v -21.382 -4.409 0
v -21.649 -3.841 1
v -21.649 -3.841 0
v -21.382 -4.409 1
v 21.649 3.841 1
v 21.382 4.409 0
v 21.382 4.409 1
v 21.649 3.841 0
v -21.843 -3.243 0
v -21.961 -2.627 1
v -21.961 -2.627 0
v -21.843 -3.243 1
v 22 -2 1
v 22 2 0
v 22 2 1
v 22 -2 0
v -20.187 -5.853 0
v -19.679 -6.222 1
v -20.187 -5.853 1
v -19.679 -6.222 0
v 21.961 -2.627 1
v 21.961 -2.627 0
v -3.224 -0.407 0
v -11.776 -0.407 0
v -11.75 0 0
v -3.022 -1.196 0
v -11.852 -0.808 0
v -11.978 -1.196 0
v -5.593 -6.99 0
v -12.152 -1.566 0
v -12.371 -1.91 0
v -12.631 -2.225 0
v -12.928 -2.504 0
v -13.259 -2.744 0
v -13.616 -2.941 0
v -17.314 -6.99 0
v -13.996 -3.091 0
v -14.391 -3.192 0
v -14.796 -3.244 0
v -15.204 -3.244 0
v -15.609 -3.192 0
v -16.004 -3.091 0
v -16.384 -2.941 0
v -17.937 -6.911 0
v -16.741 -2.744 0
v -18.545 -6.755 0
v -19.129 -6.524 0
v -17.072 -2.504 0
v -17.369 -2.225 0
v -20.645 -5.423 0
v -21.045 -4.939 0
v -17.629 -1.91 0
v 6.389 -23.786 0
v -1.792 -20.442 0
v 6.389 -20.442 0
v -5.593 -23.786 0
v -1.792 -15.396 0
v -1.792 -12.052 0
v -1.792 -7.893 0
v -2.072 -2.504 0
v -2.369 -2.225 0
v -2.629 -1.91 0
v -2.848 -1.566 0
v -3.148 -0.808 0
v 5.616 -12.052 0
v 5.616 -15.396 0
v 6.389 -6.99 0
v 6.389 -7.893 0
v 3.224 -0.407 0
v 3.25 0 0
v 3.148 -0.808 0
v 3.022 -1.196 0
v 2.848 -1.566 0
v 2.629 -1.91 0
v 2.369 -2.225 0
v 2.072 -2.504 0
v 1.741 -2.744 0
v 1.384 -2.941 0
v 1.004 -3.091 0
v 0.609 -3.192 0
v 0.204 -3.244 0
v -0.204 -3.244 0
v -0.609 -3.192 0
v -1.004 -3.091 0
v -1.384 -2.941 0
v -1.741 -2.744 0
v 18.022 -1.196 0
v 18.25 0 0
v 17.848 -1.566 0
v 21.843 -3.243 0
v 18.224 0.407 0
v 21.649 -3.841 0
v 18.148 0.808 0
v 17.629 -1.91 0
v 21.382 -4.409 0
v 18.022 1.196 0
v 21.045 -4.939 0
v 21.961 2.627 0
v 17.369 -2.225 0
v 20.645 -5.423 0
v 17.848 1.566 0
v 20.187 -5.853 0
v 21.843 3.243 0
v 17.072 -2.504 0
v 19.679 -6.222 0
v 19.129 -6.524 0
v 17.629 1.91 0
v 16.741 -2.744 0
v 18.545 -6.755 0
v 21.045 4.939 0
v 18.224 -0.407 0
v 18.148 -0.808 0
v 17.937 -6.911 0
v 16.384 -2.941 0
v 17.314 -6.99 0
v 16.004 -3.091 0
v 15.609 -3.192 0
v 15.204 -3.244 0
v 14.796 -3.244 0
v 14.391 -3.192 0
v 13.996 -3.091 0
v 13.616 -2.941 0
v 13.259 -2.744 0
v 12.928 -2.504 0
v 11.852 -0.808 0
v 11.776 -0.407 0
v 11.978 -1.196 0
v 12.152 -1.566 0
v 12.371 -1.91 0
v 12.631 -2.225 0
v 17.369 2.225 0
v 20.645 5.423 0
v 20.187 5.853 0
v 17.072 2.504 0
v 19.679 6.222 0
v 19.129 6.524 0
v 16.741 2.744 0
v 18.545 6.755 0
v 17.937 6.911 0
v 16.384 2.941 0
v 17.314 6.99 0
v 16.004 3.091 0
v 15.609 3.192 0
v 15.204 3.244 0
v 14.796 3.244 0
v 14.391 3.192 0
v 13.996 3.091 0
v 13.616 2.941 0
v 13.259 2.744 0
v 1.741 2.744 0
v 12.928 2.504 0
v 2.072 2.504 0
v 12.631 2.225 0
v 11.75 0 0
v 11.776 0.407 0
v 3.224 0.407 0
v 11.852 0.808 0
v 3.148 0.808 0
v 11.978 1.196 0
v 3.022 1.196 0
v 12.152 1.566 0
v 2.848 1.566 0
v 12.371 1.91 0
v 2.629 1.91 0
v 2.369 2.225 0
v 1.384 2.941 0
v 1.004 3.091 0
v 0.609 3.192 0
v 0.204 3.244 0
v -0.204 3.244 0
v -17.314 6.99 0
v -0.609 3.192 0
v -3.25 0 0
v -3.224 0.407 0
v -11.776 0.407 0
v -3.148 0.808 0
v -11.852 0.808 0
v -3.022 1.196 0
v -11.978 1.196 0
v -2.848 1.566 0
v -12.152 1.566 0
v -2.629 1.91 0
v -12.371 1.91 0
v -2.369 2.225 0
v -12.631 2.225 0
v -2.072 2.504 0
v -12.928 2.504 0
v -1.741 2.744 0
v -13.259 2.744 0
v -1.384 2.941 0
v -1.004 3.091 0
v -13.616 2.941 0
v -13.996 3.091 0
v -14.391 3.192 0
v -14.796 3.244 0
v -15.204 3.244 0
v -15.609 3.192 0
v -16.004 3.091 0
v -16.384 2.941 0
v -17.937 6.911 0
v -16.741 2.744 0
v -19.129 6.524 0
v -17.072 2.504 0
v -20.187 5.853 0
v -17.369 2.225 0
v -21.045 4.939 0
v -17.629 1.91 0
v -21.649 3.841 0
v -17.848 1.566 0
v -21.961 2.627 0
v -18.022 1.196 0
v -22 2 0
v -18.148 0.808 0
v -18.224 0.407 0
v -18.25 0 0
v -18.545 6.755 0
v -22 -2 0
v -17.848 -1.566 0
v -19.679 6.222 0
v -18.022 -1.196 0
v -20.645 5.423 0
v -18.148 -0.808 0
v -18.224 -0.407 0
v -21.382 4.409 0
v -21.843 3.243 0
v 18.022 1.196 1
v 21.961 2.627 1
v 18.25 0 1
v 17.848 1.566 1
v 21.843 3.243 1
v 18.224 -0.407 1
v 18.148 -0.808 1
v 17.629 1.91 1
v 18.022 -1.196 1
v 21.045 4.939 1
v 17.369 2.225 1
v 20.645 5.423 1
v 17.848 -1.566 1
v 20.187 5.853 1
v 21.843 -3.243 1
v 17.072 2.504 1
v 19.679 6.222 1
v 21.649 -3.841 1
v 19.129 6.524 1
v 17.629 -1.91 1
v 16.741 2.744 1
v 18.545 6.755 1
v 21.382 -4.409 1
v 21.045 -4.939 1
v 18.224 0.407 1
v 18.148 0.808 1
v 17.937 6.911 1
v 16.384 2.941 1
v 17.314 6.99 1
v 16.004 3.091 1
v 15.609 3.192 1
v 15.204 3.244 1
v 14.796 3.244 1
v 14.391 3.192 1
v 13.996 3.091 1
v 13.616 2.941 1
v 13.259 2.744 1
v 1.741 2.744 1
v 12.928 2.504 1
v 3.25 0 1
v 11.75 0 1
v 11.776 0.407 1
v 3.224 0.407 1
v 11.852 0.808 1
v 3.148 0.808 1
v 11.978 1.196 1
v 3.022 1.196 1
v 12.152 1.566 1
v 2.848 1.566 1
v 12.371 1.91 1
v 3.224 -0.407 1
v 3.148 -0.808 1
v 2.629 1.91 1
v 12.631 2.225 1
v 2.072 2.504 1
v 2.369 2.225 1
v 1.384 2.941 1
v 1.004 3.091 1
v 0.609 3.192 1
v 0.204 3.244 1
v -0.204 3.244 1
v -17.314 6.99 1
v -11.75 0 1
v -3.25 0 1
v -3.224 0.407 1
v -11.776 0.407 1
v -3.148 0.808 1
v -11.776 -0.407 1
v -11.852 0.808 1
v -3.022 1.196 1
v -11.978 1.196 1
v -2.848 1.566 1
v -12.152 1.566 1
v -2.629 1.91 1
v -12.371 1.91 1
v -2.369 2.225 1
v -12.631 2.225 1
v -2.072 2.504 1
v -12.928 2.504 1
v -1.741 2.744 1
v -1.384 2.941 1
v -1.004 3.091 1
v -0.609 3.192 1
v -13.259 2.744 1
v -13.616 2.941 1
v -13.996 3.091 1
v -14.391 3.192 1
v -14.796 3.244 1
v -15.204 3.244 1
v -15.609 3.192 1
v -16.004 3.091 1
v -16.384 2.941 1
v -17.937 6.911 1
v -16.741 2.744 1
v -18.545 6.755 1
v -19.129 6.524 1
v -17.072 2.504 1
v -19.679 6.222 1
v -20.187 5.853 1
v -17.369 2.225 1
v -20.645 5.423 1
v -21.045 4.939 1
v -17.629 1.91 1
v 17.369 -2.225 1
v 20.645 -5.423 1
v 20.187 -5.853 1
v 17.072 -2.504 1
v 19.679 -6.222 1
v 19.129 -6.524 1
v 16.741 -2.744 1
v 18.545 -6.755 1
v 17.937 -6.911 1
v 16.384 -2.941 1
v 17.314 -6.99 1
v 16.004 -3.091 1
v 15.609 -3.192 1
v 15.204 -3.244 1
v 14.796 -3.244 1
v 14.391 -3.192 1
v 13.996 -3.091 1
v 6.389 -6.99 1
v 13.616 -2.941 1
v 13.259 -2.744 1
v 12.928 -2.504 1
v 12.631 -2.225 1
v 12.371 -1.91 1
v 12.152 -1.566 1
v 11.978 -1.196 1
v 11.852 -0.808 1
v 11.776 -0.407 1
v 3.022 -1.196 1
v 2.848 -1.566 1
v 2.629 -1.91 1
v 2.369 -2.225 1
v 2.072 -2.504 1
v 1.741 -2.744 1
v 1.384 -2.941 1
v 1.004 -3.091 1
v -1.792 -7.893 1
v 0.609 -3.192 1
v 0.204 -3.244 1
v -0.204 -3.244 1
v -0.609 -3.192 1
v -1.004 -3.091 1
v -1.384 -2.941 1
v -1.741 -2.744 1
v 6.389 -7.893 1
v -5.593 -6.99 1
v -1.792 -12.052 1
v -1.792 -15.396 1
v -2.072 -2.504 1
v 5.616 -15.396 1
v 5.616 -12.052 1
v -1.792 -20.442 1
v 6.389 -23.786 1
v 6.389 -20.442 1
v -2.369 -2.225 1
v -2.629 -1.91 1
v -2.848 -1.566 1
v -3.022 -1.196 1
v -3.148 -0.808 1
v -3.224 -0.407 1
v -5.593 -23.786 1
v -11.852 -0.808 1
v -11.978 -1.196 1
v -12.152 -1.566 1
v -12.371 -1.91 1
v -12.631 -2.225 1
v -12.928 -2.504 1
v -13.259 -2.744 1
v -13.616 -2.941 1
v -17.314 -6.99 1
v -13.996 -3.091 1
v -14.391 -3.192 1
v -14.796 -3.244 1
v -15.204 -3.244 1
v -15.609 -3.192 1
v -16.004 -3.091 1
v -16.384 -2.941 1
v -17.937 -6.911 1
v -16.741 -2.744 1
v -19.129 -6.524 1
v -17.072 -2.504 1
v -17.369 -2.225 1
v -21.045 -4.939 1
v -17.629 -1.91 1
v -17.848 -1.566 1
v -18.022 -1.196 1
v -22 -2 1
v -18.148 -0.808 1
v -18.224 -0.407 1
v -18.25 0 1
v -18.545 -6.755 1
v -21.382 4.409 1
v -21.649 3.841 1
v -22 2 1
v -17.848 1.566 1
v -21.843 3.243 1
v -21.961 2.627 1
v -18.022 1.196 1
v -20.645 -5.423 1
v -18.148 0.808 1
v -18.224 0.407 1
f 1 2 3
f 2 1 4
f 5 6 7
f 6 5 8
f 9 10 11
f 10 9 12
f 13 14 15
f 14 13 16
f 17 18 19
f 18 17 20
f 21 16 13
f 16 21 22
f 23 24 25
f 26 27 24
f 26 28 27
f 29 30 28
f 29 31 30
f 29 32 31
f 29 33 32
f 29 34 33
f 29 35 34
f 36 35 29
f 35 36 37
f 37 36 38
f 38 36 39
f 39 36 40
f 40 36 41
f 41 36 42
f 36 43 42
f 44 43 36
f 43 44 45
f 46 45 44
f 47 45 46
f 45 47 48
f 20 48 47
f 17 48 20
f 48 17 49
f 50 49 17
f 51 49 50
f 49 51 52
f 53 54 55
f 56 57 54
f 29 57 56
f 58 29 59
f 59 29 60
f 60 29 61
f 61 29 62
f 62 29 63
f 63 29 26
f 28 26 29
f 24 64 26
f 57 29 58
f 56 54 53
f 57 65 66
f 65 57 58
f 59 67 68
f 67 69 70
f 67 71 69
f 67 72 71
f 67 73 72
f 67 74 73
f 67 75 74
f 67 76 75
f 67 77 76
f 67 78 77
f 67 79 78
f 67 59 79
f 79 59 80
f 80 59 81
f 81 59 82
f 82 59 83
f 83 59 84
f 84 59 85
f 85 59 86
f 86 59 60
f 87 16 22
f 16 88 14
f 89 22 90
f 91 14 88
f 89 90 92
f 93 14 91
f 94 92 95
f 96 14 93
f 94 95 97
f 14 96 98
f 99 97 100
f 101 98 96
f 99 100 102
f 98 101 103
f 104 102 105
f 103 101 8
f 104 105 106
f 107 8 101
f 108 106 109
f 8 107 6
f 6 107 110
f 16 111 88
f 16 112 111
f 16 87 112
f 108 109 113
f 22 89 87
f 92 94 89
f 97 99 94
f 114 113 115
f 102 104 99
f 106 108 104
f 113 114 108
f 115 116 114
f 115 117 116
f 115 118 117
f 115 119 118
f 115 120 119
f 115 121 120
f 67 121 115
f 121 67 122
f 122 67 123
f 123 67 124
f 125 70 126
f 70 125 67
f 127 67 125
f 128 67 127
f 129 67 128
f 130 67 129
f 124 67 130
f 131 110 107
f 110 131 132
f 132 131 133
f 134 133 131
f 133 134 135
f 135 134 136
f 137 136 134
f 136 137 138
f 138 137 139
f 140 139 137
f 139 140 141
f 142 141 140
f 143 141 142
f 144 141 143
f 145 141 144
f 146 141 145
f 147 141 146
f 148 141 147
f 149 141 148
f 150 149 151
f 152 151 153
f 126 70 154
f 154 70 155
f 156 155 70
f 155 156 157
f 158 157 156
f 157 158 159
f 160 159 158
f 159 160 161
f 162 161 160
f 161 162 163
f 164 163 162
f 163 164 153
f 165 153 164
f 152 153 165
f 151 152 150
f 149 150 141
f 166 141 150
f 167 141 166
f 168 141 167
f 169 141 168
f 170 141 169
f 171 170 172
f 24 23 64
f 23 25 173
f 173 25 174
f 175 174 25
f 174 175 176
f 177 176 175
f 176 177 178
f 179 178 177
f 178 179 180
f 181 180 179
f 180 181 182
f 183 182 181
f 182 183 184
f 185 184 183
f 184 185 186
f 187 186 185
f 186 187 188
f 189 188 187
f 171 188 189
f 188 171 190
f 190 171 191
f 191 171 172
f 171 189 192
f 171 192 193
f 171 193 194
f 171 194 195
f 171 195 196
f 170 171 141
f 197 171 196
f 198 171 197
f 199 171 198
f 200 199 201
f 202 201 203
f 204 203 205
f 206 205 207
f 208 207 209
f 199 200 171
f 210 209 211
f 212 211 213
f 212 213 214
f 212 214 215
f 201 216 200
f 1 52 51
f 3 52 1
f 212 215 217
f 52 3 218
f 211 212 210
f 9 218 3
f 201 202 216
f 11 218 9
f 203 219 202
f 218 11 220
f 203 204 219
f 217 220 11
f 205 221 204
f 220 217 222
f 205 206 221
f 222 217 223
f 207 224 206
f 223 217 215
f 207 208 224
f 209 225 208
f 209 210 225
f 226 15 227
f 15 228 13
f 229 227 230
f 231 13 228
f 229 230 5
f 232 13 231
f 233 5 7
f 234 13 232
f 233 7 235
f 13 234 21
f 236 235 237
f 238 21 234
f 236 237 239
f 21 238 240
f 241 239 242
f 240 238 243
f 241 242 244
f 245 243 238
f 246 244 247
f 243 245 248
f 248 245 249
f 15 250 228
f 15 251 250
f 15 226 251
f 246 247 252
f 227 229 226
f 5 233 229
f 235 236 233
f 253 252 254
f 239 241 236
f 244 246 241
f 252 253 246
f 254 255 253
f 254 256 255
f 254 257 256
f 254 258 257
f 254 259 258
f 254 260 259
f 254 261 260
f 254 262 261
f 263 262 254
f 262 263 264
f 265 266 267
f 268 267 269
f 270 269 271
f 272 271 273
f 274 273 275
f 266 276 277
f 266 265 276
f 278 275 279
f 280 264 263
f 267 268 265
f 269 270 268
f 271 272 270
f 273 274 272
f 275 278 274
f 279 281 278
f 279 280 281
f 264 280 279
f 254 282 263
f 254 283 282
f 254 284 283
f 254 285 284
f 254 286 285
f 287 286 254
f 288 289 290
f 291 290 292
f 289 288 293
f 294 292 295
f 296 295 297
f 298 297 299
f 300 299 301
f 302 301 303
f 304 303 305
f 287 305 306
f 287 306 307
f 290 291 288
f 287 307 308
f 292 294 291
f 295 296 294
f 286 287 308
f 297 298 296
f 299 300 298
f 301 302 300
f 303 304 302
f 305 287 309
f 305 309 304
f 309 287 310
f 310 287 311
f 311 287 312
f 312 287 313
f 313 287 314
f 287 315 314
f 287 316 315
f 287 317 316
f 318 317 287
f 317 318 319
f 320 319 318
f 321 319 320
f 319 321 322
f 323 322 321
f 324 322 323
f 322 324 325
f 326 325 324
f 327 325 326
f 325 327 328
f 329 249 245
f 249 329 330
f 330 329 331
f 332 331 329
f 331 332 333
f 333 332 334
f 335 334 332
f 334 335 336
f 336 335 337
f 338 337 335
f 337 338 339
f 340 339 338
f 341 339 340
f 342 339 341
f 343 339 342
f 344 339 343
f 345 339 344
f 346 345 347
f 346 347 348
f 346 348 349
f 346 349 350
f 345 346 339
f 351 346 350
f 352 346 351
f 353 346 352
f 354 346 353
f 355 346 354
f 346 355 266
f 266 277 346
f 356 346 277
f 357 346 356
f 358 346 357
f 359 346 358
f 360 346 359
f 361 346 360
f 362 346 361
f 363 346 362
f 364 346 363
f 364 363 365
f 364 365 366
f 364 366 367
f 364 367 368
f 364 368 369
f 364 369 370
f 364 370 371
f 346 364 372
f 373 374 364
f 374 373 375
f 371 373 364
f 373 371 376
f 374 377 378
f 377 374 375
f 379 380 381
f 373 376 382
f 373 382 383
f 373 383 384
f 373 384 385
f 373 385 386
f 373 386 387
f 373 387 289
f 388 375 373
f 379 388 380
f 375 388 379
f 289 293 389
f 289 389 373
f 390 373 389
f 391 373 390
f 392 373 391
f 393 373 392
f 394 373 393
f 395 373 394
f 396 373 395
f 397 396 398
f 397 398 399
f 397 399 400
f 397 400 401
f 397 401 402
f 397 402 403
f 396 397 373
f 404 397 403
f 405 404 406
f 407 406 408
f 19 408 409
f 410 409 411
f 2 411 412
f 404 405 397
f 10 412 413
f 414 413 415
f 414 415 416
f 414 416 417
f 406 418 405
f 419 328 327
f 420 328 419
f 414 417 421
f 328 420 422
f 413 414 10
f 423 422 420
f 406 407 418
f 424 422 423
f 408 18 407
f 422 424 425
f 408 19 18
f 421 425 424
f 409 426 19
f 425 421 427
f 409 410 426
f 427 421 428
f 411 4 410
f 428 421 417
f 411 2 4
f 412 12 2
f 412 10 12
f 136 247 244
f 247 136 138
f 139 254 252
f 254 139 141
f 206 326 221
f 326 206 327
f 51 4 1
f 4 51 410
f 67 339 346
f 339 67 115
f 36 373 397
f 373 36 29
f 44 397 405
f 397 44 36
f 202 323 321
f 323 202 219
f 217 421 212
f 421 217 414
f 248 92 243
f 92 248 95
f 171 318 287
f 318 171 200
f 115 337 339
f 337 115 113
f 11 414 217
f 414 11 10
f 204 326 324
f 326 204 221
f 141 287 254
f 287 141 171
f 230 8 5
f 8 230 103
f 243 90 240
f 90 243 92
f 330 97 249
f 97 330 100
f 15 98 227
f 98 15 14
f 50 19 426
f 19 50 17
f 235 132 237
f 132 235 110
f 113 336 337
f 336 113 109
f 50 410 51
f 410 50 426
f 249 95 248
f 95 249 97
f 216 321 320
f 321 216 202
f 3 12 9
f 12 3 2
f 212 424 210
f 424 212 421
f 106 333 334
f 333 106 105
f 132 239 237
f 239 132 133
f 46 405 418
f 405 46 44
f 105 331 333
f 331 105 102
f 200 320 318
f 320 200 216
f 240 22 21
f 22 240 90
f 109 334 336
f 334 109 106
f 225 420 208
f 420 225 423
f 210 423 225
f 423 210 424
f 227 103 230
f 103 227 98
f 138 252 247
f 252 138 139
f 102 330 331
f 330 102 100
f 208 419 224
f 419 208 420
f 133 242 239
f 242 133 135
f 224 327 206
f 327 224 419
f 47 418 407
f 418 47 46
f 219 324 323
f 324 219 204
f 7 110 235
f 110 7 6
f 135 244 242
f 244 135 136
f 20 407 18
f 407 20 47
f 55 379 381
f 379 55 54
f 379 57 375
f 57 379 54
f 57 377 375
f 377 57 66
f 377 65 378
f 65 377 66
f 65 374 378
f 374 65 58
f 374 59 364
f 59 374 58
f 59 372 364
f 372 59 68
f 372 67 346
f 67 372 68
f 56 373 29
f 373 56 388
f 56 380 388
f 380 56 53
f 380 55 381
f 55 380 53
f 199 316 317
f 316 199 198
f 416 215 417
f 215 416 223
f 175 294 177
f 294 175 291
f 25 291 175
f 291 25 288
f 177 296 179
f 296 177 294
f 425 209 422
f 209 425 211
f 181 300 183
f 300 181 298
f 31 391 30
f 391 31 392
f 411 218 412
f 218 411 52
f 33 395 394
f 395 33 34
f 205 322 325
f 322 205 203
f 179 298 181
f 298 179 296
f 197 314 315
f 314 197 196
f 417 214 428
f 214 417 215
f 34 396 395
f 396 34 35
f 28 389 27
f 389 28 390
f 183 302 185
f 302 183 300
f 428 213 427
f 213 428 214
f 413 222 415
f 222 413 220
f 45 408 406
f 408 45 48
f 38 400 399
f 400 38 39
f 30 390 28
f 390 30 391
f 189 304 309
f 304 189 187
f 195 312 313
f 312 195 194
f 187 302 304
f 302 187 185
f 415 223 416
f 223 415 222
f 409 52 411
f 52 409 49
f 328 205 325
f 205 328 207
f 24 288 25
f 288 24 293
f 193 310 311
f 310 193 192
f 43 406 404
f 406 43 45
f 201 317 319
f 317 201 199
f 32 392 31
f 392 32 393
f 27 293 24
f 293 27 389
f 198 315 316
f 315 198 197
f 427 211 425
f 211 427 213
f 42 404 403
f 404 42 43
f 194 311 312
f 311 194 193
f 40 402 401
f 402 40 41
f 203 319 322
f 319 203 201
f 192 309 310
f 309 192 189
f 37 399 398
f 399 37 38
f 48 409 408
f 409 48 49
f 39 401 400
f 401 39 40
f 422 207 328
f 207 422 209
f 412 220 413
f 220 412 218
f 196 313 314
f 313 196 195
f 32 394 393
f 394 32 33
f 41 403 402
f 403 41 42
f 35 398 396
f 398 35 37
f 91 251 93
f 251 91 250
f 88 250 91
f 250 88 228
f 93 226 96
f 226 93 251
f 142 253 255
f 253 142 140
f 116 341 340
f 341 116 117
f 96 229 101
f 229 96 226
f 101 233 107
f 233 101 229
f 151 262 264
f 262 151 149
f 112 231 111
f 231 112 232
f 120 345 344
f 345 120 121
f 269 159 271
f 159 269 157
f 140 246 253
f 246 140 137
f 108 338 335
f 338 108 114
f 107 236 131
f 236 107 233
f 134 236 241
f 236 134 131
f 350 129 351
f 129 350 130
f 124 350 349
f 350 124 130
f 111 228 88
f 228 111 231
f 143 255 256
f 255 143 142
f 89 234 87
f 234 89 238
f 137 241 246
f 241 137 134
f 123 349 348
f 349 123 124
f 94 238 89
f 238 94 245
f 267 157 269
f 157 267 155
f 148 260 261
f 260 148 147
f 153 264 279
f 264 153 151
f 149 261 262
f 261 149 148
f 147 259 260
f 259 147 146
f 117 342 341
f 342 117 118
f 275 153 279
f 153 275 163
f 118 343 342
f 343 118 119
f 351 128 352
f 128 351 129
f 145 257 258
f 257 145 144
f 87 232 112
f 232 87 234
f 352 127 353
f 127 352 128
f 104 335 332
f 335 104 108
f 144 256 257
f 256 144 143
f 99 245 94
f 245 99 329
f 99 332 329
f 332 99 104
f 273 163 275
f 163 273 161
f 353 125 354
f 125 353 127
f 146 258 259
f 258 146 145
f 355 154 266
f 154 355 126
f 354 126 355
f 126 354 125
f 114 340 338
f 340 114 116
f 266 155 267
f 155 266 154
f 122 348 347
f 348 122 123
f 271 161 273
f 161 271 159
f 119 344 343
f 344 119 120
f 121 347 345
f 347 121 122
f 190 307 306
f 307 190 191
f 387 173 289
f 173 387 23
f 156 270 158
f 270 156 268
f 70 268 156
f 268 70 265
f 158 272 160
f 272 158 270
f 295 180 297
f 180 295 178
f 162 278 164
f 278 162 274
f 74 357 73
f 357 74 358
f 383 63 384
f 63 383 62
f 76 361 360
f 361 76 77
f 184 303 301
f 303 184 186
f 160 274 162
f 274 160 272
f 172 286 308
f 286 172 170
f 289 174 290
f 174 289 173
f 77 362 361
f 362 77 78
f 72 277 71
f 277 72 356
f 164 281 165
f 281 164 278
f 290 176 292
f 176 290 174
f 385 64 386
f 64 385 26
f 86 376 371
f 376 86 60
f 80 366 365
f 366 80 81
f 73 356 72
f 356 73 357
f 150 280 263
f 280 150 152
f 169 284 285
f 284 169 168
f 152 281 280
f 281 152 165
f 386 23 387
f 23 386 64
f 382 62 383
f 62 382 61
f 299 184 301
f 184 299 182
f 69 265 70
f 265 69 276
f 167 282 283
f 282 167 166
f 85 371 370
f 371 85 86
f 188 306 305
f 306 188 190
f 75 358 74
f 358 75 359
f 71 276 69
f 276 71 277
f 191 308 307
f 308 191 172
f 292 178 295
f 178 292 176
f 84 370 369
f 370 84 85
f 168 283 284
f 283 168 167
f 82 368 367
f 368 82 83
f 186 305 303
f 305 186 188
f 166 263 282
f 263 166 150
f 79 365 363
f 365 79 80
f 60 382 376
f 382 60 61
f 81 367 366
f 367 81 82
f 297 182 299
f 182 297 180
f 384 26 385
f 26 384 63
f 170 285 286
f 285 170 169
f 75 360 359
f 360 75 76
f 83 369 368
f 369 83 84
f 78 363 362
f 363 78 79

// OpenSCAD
$fn = 50;


difference() {
	union() {
		translate(v = [0, 0, 0]) {
			rotate(a = [0, 0, 0]) {
				hull() {
					translate(v = [-17.0000000000, 2.0000000000, 0]) {
						rotate(a = [0, 0, 0]) {
							translate(v = [0, 0, 0]) {
								rotate(a = [0, 0, 0]) {
									cylinder(h = 1, r = 5);
								}
							}
						}
					}
					translate(v = [17.0000000000, 2.0000000000, 0]) {
						rotate(a = [0, 0, 0]) {
							translate(v = [0, 0, 0]) {
								rotate(a = [0, 0, 0]) {
									cylinder(h = 1, r = 5);
								}
							}
						}
					}
					translate(v = [-17.0000000000, -2.0000000000, 0]) {
						rotate(a = [0, 0, 0]) {
							translate(v = [0, 0, 0]) {
								rotate(a = [0, 0, 0]) {
									cylinder(h = 1, r = 5);
								}
							}
						}
					}
					translate(v = [17.0000000000, -2.0000000000, 0]) {
						rotate(a = [0, 0, 0]) {
							translate(v = [0, 0, 0]) {
								rotate(a = [0, 0, 0]) {
									cylinder(h = 1, r = 5);
								}
							}
						}
					}
				}
			}
		}
		translate(v = [0, -5, 0]) {
			rotate(a = [0, 0, 0]) {
				linear_extrude(height = 1) {
					text(font = "DejaVu Sans Mono:style=Bold", halign = "center", size = 19.0000000000, text = "E", valign = "top");
				}
			}
		}
	}
	union() {
		translate(v = [-15.0000000000, 0.0000000000, -125.0000000000]) {
			rotate(a = [0, 0, 0]) {
				cylinder(h = 250, r = 3.2500000000);
			}
		}
		translate(v = [15.0000000000, 0.0000000000, -125.0000000000]) {
			rotate(a = [0, 0, 0]) {
				cylinder(h = 250, r = 3.2500000000);
			}
		}
		translate(v = [15.0000000000, 0.0000000000, -125.0000000000]) {
			rotate(a = [0, 0, 0]) {
				cylinder(h = 250, r = 3.2500000000);
			}
		}
		translate(v = [0, 0, -125.0000000000]) {
			rotate(a = [0, 0, 0]) {
				cylinder(h = 250, r = 3.2500000000);
			}
		}
	}
}
